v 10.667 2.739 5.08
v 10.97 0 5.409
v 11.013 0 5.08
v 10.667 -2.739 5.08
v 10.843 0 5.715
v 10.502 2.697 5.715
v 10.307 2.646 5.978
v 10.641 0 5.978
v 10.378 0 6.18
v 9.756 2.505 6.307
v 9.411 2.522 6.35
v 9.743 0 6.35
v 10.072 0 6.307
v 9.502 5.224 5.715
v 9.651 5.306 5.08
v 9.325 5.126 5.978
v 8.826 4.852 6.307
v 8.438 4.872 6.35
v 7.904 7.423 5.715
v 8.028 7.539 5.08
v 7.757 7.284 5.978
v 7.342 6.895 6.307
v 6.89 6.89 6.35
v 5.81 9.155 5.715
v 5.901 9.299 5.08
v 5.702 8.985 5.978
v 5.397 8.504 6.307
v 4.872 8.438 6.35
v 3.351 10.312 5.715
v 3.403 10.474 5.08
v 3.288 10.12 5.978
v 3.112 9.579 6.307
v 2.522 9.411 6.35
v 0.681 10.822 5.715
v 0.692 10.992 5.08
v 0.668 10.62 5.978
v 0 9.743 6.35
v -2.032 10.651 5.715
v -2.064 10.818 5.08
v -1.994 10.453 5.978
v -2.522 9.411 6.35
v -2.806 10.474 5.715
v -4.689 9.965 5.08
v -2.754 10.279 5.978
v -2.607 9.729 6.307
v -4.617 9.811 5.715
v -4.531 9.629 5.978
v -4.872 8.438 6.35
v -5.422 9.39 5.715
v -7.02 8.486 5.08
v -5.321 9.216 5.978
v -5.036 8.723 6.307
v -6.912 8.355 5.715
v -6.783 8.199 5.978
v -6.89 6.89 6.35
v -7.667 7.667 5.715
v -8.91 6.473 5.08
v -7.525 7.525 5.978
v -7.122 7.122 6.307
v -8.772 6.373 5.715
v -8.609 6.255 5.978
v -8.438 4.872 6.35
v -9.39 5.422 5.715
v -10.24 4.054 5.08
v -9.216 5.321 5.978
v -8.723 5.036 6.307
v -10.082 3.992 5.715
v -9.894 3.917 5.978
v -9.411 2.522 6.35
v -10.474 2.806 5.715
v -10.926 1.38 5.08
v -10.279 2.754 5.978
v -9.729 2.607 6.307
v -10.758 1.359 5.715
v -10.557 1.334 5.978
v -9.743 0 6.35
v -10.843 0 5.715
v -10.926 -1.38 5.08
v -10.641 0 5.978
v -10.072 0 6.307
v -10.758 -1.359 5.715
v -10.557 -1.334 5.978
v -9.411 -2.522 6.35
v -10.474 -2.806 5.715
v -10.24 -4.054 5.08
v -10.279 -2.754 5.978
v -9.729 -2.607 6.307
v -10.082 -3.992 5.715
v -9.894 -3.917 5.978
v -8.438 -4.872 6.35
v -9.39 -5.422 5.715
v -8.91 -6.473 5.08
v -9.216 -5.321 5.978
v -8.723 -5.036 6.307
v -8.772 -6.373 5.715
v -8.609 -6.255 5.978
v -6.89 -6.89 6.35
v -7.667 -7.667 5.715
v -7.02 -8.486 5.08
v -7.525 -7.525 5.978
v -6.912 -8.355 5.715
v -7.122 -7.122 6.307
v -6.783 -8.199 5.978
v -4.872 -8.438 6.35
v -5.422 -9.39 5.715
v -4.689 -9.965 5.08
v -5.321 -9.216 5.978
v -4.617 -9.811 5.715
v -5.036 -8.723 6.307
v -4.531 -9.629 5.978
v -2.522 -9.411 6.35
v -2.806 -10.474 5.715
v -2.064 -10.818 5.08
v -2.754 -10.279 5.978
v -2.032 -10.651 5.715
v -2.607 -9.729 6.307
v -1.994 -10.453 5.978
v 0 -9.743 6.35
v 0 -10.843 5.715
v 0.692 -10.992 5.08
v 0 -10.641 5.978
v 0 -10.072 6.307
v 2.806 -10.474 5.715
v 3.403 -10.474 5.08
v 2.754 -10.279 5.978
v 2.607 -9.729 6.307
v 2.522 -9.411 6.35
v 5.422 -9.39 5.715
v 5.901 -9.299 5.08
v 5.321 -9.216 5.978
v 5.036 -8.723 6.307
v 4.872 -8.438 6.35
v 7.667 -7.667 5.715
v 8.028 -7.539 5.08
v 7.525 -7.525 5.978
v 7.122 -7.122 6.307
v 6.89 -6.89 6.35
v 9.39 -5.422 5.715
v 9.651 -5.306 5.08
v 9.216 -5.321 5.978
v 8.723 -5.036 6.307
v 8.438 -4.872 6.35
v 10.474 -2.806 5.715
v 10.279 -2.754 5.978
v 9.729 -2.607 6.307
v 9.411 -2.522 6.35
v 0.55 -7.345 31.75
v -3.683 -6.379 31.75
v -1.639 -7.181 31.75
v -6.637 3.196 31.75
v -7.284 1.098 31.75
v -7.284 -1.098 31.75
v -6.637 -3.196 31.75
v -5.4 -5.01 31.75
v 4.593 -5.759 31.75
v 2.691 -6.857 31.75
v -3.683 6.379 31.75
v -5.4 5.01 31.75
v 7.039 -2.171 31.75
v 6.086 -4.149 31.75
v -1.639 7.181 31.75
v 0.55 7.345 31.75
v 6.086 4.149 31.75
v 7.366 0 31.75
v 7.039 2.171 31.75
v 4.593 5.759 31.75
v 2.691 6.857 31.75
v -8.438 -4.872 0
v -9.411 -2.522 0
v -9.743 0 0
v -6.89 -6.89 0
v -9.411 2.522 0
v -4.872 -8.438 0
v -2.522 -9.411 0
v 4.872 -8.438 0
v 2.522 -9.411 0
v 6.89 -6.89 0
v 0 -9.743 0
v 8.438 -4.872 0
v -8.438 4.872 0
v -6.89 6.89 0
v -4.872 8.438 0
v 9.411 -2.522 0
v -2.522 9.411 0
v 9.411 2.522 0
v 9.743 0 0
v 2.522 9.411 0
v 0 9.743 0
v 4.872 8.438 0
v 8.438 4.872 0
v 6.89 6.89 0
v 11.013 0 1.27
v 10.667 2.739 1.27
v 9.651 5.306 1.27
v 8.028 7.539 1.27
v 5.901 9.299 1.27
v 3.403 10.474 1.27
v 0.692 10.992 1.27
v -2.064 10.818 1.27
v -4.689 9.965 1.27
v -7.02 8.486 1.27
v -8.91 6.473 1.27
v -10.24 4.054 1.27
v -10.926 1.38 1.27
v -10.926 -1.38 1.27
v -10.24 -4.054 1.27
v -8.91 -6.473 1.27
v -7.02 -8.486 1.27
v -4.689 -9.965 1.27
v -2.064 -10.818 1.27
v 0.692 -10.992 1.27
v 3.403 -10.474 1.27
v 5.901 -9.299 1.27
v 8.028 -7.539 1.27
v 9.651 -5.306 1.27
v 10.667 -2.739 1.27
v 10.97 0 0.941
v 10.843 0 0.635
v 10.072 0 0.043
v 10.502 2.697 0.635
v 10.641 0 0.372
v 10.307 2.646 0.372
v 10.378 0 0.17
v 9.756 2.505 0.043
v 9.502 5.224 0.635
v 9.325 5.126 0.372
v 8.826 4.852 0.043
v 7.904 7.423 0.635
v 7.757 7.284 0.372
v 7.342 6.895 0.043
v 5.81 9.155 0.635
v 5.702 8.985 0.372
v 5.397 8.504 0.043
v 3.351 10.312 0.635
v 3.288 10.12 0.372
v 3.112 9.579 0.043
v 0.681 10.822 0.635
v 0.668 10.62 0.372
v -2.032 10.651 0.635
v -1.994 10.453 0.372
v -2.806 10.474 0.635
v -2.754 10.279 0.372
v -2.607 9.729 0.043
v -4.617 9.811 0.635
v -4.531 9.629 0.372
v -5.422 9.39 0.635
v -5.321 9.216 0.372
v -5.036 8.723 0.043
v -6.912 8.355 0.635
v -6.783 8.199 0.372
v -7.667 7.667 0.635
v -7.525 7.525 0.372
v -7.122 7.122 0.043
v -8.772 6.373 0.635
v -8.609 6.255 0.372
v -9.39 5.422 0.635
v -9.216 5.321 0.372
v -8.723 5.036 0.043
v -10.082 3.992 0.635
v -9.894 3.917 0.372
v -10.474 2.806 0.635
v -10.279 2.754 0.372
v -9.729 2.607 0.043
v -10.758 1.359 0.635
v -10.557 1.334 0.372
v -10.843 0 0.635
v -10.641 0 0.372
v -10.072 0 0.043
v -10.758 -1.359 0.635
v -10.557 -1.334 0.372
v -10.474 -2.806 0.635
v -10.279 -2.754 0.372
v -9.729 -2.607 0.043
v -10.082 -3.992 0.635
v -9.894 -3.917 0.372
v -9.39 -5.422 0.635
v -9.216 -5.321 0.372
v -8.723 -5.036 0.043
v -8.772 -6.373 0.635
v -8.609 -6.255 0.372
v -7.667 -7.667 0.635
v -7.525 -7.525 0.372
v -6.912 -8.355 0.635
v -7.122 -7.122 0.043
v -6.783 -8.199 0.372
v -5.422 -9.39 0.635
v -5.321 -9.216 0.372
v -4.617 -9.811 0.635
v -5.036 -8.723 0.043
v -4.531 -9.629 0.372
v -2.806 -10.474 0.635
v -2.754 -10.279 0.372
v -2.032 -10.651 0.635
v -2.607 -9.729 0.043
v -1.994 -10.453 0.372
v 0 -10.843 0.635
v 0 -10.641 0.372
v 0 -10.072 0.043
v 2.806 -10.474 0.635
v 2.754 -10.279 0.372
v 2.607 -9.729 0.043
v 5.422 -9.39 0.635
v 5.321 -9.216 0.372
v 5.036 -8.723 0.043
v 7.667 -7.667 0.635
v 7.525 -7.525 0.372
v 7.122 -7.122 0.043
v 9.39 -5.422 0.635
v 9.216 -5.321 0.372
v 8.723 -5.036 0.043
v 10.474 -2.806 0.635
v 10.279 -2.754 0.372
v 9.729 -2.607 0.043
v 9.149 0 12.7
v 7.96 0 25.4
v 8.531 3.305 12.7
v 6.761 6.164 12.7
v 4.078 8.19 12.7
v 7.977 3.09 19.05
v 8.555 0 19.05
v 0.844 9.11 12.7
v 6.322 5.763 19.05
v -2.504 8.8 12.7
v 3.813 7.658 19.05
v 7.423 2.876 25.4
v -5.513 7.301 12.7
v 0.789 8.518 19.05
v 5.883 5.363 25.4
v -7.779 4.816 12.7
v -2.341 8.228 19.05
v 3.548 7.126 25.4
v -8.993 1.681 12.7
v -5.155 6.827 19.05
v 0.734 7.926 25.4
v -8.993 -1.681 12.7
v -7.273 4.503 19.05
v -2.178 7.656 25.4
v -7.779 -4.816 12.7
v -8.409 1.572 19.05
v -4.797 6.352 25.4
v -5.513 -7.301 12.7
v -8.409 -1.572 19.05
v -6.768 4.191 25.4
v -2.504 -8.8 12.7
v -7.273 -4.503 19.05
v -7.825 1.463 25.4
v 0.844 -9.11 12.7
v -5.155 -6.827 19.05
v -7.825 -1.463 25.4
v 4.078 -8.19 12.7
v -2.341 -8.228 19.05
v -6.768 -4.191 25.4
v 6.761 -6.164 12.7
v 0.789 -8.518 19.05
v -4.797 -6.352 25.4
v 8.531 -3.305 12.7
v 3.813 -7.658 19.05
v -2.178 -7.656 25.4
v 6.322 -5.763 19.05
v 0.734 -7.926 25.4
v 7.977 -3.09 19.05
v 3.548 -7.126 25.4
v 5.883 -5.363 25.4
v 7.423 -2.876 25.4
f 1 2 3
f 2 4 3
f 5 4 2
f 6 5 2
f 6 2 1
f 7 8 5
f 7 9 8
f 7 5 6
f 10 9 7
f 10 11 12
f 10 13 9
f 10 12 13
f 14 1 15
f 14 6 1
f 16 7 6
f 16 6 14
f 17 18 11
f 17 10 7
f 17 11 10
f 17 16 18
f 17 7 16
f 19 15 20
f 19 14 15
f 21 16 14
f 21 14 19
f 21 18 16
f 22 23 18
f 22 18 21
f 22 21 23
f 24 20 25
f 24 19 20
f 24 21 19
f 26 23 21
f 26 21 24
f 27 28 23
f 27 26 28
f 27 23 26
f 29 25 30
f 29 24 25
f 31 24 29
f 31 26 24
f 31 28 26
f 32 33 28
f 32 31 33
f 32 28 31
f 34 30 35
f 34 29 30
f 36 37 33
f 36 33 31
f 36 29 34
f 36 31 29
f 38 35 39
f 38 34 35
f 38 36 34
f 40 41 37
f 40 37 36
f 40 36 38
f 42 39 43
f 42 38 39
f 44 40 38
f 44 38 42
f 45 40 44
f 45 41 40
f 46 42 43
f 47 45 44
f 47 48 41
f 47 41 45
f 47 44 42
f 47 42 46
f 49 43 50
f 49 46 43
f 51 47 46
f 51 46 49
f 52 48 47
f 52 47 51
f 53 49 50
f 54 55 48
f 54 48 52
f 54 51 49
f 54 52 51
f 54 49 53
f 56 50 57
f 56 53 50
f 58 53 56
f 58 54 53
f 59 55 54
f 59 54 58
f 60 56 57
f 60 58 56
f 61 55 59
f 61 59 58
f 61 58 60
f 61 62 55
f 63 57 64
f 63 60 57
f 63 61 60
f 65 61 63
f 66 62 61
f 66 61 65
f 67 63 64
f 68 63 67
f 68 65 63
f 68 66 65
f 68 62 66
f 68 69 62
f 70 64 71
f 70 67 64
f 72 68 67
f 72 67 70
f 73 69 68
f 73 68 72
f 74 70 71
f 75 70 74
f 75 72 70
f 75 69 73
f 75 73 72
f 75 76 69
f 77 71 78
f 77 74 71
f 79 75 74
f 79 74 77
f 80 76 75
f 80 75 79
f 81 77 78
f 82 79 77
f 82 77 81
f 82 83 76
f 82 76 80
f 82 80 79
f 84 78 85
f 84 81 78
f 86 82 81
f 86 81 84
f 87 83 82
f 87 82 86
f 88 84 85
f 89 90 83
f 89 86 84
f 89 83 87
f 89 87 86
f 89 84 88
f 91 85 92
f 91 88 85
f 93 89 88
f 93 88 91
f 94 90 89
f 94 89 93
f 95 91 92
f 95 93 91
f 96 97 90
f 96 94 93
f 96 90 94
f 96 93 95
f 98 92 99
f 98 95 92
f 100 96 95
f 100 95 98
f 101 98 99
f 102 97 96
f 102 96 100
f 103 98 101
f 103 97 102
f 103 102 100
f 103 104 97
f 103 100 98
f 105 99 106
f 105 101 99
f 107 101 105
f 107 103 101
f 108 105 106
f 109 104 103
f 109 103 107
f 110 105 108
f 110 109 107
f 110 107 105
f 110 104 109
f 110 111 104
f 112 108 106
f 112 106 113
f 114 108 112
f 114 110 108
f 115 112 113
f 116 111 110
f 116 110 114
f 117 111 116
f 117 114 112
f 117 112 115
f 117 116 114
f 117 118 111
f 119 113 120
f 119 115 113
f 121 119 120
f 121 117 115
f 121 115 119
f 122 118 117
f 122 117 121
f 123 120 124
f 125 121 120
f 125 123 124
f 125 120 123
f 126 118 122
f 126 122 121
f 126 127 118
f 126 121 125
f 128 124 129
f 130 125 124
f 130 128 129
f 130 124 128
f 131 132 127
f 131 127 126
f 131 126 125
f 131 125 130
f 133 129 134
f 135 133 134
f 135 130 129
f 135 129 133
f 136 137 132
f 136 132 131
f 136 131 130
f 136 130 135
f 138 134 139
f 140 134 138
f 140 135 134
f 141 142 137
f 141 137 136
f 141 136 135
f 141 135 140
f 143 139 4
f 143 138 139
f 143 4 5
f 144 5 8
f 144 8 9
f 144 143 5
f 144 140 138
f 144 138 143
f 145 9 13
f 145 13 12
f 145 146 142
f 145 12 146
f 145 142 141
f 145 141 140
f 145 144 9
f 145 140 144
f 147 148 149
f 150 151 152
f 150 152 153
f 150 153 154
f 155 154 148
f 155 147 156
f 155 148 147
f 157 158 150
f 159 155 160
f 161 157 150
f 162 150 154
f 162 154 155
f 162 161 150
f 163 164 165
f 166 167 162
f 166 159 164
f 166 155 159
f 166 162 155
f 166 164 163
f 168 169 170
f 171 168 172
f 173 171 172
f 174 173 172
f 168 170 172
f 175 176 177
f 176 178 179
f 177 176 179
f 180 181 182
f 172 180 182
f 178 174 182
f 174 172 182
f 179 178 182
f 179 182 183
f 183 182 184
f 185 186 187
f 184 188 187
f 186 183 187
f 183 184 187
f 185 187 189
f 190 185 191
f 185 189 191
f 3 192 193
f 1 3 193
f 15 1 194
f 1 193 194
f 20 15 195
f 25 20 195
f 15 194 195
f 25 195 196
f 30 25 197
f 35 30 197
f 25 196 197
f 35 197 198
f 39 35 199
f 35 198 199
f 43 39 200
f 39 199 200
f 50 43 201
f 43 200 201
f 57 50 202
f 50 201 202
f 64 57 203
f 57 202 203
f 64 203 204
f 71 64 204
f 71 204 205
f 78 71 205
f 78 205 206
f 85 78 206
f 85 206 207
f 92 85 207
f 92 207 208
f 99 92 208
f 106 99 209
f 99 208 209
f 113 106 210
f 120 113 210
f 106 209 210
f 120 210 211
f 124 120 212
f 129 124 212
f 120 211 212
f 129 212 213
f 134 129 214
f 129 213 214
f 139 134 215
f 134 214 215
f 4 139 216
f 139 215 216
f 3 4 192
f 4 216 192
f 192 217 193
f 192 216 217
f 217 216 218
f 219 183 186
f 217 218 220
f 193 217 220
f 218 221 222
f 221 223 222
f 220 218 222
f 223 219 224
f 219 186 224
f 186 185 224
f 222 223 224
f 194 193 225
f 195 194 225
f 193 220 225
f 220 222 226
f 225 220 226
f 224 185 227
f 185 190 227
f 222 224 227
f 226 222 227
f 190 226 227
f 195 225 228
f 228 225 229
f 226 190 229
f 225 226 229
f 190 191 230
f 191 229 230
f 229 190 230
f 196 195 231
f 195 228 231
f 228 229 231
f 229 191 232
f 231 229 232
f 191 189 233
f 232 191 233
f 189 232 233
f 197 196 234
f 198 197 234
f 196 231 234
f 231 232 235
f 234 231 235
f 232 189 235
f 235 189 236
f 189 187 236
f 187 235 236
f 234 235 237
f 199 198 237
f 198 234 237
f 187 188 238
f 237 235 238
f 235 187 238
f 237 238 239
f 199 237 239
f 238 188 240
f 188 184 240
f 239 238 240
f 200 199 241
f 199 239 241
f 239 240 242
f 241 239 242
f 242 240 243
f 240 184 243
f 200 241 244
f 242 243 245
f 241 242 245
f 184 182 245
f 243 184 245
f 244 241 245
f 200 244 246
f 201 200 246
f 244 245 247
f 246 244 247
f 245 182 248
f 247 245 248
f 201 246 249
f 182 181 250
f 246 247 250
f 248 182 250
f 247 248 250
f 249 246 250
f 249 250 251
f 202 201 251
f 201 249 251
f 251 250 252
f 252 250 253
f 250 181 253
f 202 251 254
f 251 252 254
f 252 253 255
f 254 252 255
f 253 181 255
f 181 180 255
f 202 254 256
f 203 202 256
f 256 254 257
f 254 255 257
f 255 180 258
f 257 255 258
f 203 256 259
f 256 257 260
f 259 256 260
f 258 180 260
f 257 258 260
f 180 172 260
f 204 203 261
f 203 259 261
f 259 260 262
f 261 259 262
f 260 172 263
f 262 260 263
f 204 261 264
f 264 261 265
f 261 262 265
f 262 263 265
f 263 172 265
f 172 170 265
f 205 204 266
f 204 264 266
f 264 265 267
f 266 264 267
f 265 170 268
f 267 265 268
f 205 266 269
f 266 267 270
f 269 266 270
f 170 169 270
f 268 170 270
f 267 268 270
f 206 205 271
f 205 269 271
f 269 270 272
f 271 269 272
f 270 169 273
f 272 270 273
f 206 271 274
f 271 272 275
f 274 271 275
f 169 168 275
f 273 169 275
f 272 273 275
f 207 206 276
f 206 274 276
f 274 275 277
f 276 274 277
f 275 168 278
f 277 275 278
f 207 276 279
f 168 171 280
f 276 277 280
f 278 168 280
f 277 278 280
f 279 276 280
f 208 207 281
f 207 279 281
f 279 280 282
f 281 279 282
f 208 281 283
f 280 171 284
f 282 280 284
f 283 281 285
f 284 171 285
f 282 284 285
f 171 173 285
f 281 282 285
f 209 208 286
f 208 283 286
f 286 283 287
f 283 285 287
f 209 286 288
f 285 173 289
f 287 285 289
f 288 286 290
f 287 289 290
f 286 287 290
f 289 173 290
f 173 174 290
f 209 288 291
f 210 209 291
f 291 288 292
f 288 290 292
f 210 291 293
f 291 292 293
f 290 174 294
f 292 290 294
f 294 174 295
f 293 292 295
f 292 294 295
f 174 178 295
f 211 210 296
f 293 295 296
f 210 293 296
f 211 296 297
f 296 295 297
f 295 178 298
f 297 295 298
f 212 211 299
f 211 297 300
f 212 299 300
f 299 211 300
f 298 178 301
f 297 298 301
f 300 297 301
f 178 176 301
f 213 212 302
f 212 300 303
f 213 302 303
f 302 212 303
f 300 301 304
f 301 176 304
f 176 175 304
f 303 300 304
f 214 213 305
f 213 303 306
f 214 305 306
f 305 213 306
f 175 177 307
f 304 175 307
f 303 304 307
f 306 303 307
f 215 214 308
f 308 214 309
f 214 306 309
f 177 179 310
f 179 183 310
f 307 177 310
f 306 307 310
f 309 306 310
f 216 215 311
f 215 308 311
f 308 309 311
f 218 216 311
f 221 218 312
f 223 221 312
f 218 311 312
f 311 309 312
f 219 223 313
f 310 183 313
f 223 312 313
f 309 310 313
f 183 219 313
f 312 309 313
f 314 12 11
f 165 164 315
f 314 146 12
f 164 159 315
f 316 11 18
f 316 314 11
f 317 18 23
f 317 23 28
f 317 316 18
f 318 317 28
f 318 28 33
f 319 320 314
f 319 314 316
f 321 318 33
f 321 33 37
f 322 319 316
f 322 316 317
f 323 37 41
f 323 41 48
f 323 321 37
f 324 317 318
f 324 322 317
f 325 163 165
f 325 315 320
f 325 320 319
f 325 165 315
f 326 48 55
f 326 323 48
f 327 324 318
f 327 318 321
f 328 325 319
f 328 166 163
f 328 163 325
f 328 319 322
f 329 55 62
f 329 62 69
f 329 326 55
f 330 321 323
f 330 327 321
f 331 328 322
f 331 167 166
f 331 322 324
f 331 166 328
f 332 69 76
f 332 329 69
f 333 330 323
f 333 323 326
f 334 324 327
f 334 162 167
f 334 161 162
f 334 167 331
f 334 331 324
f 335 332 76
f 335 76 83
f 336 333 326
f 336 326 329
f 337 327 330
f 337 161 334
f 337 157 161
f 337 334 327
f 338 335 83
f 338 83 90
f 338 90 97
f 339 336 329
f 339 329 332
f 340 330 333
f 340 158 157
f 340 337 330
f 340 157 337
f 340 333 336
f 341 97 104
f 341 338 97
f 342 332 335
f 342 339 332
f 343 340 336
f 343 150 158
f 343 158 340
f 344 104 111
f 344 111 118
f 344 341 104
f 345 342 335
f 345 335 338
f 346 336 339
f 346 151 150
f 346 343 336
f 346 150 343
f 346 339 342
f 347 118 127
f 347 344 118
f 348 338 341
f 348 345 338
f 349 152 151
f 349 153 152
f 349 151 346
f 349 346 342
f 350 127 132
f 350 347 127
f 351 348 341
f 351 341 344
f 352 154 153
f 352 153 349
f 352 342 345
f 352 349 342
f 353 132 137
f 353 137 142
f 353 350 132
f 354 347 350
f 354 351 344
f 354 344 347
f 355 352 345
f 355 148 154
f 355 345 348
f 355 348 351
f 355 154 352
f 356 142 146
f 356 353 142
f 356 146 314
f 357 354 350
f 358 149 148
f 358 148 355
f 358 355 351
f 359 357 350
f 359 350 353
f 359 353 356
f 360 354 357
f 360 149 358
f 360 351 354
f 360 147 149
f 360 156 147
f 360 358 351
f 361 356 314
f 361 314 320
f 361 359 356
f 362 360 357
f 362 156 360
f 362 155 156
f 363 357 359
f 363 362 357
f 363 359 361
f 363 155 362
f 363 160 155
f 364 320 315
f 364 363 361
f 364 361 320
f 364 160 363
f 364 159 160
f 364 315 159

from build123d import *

# Parameters (mm, degrees)
F0_R      = 11.013281
F1_DEPTH  = 6.35
F2_R      = 1.27
F1_FACE_R = 9.743281
F4_R      = 7.366


with BuildPart() as f1:
    # F0 (on Top) → F1 (new body)
    with BuildSketch(Plane.XY):
        Circle(F0_R)
    extrude(amount=F1_DEPTH)

    # F2
    f2_edges = [f1.edges().sort_by_distance(p)[0] for p in [
        (-11.013281, 0, 6.35),
        (-11.013281, 0, 0),
    ]]
    fillet(f2_edges, radius=F2_R)

    # F1_face (on face) → F5 section 0
    with BuildSketch(Plane.XY.offset(6.35)):
        Circle(F1_FACE_R)
    # F4 (on offset) → F5 section 1
    with BuildSketch(Plane.XY.offset(31.75)):
        Circle(F4_R)
    loft()


solid = f1.part
